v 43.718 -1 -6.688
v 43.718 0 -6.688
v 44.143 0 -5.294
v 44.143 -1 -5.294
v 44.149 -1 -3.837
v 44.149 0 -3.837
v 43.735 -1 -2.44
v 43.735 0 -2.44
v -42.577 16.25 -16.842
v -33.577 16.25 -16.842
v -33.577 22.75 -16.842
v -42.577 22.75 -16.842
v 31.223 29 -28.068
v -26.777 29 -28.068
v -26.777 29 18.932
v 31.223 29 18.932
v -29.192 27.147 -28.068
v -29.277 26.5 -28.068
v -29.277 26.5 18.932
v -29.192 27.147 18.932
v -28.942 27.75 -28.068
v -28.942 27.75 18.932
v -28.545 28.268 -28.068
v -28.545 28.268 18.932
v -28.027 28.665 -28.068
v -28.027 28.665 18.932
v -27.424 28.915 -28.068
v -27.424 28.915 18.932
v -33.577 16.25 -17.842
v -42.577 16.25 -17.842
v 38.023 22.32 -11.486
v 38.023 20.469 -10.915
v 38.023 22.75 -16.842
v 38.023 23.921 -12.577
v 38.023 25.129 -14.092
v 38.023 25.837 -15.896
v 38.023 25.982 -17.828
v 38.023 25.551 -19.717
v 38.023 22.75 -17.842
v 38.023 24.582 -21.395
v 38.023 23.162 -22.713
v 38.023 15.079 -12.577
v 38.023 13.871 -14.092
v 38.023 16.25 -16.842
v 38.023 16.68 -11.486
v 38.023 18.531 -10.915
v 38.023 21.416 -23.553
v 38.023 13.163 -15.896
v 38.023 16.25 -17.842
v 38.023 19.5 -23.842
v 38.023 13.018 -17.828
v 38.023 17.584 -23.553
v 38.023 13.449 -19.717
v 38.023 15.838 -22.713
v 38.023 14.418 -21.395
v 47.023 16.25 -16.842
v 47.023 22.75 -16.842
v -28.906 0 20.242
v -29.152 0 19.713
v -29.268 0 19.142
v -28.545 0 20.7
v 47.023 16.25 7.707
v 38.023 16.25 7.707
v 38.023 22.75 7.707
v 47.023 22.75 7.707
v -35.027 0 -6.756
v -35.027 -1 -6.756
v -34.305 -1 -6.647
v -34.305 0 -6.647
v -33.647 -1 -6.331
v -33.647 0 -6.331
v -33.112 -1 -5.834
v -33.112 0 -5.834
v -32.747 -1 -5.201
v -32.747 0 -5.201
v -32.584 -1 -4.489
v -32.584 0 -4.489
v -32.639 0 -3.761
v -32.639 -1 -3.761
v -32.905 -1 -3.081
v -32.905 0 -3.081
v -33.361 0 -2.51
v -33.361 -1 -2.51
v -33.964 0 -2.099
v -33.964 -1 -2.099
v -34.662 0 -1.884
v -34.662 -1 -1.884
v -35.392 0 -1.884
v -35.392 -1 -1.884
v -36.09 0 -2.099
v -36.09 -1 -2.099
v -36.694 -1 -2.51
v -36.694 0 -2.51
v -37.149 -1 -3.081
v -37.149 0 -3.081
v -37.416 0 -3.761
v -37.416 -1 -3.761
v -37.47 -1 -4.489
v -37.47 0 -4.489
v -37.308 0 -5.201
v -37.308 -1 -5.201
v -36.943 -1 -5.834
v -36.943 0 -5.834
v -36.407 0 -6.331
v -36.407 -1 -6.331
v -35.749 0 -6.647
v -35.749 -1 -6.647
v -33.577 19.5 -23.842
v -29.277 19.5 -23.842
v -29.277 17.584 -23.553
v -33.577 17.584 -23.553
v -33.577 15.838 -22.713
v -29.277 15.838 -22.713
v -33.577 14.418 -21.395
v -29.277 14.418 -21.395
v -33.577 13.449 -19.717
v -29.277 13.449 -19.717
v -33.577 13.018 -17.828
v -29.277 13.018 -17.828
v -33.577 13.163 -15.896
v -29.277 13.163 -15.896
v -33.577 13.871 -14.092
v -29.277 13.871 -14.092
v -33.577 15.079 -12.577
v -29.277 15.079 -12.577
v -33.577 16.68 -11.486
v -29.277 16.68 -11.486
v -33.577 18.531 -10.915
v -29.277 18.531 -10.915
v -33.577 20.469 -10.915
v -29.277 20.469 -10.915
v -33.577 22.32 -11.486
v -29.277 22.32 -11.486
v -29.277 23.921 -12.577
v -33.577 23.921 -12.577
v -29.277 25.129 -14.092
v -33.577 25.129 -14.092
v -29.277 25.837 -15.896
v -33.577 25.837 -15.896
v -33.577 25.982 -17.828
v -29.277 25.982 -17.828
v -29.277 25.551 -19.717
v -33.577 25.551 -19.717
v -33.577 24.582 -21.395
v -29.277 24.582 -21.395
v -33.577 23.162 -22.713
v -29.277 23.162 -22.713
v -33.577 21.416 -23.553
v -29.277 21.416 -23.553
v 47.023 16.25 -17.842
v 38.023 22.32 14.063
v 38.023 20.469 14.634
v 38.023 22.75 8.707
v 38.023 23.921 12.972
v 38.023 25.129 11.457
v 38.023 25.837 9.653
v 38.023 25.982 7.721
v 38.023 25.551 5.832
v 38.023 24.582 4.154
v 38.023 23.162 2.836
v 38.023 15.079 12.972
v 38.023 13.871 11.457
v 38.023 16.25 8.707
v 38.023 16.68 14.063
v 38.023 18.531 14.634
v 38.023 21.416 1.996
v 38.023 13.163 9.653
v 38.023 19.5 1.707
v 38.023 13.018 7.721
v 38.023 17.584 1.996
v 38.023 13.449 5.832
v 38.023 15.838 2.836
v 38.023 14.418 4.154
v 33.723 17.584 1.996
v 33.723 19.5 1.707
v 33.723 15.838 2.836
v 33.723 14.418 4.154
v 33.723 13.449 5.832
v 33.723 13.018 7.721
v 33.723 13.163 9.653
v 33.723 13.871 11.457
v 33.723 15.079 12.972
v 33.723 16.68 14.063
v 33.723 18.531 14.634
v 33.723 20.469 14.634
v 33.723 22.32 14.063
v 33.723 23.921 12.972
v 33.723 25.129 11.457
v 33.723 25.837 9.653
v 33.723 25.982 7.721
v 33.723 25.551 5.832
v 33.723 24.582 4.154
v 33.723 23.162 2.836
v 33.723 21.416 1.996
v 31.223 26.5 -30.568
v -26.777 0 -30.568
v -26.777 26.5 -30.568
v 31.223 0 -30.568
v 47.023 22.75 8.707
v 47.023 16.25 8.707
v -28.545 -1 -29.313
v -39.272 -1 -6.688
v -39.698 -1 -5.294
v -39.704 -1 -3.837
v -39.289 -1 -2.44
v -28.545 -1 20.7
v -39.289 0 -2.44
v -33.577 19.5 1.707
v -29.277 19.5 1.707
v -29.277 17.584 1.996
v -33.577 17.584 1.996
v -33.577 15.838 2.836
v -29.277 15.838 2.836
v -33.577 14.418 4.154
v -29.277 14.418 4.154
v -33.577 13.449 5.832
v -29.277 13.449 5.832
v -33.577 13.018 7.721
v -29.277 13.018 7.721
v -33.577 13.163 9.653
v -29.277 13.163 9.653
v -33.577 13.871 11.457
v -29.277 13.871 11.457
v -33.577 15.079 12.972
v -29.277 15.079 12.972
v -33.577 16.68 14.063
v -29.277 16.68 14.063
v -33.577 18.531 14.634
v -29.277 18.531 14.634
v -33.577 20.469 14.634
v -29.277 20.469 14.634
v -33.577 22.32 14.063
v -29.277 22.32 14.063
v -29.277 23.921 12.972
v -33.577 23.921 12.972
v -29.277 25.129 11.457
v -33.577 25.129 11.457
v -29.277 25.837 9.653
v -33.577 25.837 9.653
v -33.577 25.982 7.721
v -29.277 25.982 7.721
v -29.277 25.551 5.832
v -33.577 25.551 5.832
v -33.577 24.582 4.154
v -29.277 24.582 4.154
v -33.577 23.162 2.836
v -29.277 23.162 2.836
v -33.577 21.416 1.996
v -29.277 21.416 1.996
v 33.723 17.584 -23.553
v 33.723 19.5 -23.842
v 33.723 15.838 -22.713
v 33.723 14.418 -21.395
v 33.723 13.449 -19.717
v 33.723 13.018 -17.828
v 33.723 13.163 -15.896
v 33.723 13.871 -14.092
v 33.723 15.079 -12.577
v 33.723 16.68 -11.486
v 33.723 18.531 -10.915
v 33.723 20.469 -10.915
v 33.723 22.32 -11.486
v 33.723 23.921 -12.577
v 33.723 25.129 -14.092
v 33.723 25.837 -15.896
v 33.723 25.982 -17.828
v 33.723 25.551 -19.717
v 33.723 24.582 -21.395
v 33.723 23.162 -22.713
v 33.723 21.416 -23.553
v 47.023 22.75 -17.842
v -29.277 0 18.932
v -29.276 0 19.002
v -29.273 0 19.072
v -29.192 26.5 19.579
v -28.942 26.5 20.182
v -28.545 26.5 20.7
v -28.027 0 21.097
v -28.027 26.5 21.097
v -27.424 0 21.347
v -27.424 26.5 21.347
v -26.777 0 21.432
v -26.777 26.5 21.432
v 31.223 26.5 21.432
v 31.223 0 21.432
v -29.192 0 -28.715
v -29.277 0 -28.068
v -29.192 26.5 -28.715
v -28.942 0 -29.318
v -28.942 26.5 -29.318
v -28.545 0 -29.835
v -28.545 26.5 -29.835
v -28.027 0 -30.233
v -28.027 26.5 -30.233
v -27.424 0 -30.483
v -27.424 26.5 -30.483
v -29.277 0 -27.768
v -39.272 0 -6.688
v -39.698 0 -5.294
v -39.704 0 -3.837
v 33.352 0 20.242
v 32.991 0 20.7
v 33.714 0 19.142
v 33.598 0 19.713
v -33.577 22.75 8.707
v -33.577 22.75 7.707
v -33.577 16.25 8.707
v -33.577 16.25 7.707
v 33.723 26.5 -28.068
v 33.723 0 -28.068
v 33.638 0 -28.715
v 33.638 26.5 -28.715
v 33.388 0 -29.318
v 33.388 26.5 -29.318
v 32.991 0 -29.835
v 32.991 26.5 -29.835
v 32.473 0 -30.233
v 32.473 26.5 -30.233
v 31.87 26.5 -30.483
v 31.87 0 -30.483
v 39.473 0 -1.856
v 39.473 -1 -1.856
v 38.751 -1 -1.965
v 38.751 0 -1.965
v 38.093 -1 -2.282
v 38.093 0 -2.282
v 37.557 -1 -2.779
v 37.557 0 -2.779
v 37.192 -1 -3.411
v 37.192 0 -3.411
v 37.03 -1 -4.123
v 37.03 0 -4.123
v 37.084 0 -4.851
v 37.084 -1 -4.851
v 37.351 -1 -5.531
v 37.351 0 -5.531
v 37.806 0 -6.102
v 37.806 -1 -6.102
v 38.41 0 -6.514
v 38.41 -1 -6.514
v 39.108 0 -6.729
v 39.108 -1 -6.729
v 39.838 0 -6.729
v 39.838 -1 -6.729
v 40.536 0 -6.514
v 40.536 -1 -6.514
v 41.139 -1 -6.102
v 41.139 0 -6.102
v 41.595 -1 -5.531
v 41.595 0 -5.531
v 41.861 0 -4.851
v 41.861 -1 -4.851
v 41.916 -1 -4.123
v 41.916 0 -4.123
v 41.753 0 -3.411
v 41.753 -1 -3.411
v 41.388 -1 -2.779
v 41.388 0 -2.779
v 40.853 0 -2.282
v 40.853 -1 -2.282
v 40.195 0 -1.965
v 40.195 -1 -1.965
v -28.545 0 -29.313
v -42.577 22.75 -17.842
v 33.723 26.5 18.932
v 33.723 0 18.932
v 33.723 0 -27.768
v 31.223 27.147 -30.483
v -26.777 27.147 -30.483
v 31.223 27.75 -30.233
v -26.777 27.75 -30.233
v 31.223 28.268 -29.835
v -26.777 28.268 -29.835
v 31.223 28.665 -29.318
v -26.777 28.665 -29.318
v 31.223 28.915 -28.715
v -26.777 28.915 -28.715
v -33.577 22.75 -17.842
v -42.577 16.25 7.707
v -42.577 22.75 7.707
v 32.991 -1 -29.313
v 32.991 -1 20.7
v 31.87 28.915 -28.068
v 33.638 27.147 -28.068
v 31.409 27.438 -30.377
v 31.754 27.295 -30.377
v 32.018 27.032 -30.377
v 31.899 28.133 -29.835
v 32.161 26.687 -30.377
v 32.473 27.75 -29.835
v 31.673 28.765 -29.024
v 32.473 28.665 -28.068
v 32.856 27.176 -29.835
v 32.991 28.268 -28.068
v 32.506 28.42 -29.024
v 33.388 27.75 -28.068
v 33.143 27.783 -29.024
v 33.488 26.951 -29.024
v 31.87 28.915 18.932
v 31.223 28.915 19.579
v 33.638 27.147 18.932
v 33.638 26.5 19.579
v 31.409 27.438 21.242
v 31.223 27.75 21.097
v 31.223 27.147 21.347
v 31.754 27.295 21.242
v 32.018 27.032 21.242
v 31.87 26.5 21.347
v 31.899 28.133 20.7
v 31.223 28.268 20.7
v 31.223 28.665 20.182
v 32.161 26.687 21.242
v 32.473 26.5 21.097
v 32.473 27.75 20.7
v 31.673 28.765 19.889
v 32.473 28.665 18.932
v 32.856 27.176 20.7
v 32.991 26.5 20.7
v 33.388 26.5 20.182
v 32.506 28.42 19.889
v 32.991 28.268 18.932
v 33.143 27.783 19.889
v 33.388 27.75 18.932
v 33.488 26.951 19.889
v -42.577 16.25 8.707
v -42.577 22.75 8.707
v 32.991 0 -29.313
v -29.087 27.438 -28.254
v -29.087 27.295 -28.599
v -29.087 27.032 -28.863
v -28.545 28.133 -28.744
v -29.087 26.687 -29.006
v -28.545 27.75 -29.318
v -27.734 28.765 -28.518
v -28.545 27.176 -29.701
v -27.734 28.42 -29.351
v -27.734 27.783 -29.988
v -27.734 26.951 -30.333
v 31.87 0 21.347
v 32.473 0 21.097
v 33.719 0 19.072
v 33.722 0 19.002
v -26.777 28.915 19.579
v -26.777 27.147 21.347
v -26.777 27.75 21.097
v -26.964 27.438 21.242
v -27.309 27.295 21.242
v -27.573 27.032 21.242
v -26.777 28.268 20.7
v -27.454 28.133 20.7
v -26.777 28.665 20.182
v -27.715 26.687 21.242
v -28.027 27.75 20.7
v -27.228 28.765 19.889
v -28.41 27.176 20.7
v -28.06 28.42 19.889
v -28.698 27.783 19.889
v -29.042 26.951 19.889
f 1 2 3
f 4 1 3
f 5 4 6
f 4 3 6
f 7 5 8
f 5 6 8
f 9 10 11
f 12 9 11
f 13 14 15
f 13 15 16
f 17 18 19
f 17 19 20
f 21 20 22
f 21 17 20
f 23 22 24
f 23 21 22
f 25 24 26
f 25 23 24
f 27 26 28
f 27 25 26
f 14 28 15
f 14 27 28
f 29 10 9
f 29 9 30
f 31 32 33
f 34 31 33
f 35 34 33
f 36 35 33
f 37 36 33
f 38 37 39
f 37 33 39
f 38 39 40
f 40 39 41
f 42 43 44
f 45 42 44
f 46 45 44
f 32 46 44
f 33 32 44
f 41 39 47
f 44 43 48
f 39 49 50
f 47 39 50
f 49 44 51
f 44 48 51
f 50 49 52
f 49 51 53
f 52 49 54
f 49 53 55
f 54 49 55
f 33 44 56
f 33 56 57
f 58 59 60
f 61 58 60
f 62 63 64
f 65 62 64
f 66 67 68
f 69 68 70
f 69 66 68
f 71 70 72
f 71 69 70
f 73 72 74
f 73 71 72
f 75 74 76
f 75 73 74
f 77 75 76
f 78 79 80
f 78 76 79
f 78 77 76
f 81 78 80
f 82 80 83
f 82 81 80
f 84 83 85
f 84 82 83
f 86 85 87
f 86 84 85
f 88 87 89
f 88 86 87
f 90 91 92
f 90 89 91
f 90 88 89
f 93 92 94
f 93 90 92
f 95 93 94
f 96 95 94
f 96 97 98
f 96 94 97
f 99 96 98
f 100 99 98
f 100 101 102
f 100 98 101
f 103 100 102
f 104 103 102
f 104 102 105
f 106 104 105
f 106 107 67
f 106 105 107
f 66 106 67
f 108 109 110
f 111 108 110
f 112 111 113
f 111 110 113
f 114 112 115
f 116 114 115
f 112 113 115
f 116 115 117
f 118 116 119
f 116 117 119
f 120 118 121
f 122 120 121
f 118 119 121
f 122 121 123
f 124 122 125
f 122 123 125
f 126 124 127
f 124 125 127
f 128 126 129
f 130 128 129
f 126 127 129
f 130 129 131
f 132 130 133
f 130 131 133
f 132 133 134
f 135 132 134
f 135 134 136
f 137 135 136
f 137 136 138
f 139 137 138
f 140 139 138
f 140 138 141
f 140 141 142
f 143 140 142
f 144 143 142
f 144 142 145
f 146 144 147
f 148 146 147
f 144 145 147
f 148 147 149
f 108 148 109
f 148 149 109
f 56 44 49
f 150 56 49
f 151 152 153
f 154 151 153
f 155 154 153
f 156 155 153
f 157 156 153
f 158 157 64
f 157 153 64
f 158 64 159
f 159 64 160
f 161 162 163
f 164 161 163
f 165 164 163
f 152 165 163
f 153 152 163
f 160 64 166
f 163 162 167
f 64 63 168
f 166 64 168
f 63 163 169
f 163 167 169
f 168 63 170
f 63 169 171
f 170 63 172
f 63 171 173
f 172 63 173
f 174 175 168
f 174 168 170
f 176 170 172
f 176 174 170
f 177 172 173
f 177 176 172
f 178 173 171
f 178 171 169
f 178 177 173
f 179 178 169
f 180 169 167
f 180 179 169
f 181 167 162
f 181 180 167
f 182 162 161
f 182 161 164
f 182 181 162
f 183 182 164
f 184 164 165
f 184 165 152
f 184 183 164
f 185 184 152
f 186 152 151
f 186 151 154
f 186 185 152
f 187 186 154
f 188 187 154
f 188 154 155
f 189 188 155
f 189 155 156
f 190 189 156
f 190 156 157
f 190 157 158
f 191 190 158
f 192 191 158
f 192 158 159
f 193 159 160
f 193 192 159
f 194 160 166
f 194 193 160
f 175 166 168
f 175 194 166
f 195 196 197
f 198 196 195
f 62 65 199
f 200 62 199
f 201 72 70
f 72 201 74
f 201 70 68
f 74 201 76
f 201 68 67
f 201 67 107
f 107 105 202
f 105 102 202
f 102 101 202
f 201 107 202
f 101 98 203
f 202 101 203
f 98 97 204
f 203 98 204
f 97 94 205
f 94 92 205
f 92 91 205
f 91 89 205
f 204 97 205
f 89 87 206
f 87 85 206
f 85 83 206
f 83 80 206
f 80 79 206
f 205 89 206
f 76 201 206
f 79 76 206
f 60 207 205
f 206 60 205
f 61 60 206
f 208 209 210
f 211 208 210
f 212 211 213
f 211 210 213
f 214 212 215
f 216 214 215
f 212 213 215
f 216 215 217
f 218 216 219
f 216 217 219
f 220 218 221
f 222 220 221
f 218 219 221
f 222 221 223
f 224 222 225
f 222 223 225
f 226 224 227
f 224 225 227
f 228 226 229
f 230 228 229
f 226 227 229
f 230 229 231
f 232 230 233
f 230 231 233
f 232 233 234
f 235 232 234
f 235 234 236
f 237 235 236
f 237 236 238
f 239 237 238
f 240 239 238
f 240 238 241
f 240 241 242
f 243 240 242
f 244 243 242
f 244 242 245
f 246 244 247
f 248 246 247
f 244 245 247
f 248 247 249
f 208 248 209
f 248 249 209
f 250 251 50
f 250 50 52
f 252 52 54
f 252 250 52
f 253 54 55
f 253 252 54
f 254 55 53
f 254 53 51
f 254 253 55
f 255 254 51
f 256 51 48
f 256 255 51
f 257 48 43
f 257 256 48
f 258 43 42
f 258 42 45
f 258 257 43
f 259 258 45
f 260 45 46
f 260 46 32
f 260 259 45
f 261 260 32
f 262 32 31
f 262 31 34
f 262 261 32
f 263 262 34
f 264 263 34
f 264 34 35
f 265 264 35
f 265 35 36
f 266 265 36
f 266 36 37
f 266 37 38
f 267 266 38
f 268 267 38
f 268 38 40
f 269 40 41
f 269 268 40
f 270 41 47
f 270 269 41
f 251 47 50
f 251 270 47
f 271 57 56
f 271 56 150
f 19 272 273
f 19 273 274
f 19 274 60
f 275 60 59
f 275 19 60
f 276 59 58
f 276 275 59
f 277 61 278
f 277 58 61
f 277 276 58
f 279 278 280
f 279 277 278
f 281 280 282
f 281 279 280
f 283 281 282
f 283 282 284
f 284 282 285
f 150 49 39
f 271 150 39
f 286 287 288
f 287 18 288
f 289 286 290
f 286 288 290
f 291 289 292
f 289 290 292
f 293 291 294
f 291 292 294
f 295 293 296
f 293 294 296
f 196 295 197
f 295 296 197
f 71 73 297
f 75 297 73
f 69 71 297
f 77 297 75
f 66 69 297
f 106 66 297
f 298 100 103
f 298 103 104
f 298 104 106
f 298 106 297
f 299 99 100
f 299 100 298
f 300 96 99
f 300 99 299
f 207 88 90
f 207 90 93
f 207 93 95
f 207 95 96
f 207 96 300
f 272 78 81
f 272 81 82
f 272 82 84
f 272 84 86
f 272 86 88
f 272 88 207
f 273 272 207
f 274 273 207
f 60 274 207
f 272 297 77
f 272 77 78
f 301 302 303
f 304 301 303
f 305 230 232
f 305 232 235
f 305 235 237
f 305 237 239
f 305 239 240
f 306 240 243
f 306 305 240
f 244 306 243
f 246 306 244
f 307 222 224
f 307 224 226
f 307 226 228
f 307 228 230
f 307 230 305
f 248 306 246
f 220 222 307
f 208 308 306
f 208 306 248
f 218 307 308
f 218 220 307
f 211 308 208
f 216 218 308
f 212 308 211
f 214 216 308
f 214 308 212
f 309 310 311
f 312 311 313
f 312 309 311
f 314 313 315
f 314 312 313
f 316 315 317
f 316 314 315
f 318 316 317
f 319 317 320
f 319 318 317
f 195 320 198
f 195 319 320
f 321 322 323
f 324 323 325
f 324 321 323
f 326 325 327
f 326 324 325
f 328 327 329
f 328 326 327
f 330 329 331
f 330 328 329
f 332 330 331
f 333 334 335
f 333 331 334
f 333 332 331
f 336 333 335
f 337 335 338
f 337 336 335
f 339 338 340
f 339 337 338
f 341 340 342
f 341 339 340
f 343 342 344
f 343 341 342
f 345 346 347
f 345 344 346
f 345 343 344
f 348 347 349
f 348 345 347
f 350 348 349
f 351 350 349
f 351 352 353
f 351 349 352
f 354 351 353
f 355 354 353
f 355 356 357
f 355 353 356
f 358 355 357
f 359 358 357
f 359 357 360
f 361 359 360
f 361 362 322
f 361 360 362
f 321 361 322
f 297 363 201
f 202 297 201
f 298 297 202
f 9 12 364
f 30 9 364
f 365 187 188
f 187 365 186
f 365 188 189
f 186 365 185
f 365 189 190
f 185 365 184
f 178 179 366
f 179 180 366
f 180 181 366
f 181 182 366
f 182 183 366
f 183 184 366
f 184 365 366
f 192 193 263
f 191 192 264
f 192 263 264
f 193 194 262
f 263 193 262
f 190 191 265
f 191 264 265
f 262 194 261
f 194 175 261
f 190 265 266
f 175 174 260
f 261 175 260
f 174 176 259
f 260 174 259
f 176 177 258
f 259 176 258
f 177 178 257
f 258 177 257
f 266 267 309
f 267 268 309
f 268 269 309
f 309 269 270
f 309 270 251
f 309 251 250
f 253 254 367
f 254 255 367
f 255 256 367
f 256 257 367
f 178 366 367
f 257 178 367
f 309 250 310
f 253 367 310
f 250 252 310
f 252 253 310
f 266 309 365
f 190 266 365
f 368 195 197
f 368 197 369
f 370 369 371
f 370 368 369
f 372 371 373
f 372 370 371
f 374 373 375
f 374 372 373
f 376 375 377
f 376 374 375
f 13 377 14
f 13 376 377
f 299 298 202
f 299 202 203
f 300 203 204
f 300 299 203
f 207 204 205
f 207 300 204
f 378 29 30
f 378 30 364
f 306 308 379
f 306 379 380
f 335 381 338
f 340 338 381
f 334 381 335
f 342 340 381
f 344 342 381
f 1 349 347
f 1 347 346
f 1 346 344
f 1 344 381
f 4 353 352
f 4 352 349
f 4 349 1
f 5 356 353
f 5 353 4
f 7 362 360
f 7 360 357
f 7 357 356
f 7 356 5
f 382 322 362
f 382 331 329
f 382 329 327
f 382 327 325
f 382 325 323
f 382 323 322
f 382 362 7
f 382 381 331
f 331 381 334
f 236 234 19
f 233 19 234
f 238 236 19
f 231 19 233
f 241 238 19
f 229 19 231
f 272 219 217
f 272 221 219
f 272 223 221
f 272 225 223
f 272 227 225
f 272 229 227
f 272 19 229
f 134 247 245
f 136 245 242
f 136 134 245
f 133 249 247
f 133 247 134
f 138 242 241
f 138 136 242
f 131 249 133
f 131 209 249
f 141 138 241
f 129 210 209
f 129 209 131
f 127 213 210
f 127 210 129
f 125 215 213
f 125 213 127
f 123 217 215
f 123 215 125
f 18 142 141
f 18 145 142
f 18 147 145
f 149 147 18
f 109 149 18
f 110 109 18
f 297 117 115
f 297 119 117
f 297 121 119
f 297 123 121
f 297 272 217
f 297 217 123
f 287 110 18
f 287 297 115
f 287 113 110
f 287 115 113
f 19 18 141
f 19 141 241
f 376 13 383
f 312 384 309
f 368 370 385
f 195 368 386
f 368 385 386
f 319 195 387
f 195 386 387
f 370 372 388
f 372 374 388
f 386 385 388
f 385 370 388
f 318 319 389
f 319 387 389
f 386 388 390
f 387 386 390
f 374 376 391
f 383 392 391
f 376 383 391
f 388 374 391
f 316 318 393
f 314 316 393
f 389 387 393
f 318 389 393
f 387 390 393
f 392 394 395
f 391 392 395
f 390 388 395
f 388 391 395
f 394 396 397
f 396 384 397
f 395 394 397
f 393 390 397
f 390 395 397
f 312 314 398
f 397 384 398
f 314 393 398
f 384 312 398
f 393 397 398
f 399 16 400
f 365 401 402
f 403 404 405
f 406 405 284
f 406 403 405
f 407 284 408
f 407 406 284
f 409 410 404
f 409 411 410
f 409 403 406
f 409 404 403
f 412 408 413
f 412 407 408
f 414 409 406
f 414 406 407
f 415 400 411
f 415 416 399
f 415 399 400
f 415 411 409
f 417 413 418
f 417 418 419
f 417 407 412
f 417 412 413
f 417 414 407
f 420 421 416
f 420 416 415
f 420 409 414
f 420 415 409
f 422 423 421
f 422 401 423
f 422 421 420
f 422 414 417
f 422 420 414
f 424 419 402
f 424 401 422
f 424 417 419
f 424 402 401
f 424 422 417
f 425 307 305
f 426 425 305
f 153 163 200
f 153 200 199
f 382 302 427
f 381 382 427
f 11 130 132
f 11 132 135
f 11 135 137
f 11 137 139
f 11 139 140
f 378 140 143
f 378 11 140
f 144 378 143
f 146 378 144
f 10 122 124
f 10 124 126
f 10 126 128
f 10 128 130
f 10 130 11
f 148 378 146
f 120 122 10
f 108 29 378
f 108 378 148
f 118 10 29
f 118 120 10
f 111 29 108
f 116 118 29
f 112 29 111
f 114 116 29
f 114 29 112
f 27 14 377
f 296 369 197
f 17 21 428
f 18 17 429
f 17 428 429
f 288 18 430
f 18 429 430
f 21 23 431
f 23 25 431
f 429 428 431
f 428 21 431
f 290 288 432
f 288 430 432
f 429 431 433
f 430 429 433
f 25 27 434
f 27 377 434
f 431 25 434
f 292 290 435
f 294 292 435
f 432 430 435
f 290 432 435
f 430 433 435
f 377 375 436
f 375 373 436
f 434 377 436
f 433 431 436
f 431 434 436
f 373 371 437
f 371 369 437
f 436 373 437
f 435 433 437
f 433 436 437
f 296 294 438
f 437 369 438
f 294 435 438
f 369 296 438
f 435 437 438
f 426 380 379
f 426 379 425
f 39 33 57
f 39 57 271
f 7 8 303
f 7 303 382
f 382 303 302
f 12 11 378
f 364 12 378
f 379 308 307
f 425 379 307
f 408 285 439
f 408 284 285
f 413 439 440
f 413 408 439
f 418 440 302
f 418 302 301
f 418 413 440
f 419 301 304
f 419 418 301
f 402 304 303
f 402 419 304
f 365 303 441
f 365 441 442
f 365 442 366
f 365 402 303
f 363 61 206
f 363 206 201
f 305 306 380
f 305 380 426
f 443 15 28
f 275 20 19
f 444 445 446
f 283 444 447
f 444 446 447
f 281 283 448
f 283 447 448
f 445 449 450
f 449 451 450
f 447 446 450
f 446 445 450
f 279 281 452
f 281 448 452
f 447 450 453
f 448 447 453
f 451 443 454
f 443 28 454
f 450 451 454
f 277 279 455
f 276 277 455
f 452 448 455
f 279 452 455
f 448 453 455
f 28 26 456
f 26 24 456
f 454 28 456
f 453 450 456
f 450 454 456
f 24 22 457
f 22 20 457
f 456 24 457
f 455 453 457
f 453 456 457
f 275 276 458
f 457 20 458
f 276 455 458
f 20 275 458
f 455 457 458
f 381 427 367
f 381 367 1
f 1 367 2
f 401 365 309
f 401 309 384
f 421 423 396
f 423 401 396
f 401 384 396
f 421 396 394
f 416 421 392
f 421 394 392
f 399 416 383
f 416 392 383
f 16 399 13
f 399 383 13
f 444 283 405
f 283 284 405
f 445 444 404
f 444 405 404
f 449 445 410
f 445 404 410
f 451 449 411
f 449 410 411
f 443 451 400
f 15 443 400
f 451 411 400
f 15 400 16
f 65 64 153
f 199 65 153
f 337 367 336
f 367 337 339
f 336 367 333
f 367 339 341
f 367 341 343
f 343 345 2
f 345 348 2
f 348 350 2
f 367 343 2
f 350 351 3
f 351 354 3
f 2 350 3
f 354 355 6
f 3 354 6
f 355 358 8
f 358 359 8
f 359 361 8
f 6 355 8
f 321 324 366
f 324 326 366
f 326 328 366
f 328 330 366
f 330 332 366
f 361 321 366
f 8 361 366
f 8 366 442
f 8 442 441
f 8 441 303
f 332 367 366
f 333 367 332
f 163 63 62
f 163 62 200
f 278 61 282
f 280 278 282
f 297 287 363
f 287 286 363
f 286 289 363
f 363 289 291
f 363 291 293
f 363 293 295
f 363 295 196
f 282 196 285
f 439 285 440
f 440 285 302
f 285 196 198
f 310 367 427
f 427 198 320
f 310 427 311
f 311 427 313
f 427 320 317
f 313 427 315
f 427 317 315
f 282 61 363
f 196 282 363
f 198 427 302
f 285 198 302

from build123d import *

# Parameters (mm, degrees)
SZKIC1_W                    = 63
SZKIC1_H                    = 52
DODANIE_WYCI_GNI_CIE1_DEPTH = 29
ZAOKR_GLENIE1_R             = 2.5
DODANIE_WYCI_GNI_CIE2_DEPTH = 1
SZKIC3_R                    = 2.45
WYTNIJ_WYCI_GNI_CIE6_DEPTH  = 62.065626678
SZKIC4_R                    = 6.5
DODANIE_WYCI_GNI_CIE3_DEPTH = 4.3
SZKIC5_W                    = 1
SZKIC5_H                    = 6.5
DODANIE_WYCI_GNI_CIE4_DEPTH = 9
LUSTRO4_COPY_1_SKETCH_W     = 1
LUSTRO4_COPY_1_SKETCH_H     = 6.5
LUSTRO4_COPY_1_DEPTH        = 9
LUSTRO4_COPY_2_SKETCH_W     = 1
LUSTRO4_COPY_2_SKETCH_H     = 6.5
LUSTRO4_COPY_2_DEPTH        = 9


with BuildPart() as part:
    # Szkic1 → Dodanie-wyciągnięcie1 (new body)
    with BuildSketch(Plane(origin=(0, 0, 0), x_dir=(1, 0, 0), z_dir=(0, 1, 0))):
        with Locations((2.222834646, 4.567716535)):
            Rectangle(SZKIC1_W, SZKIC1_H)
    extrude(amount=DODANIE_WYCI_GNI_CIE1_DEPTH)

    # Zaokrąglenie1
    zaokr_glenie1_edges = [part.edges().sort_by_distance(p)[0] for p in [
        (33.722834646, 29, -4.567716535),
        (2.222834646, 29, -30.567716535),
        (-29.277165354, 29, -4.567716535),
        (2.222834646, 29, 21.432283465),
        (-29.277165354, 14.5, -30.567716535),
        (33.722834646, 14.5, -30.567716535),
        (33.722834646, 14.5, 21.432283465),
        (-29.277165354, 14.5, 21.432283465),
    ]]
    fillet(zaokr_glenie1_edges, radius=ZAOKR_GLENIE1_R)

    # Szkic2 → Dodanie-wyciągnięcie2 (add)
    with BuildSketch(Plane.XZ):
        with BuildLine():
            Line((-39.289158378, -2.43984114), (-28.544932307, 20.700050418))
            Line((-28.544932307, 20.700050418), (-28.544932307, -29.312606034))
            Line((-28.544932307, -29.312606034), (-39.272080362, -6.687578711))
            ThreePointArc((-39.272080362, -6.687578711), (-39.754125902, -4.565613657), (-39.289158378, -2.43984114))
        make_face()
        with BuildLine():
            Line((32.990601599, 20.700050418), (32.990601599, -29.312606034))
            Line((32.990601599, -29.312606034), (43.717749653, -6.687578711))
            ThreePointArc((43.717749653, -6.687578711), (44.199795194, -4.565613657), (43.734827669, -2.43984114))
            Line((43.734827669, -2.43984114), (32.990601599, 20.700050418))
        make_face()
    extrude(amount=DODANIE_WYCI_GNI_CIE2_DEPTH)

    # Szkic3 → Wytnij-wyciągnięcie6 (cut, through all)
    with BuildSketch(Plane.XZ):
        with Locations(Location((-35.027165354, -4.306277808, 0), (0, 0, 270))):
            Circle(SZKIC3_R)
        with Locations(Location((39.472834646, -4.306277808, 0), (0, 0, 90))):
            Circle(SZKIC3_R)
    extrude(amount=WYTNIJ_WYCI_GNI_CIE6_DEPTH, mode=Mode.SUBTRACT)

    # Szkic4 → Dodanie-wyciągnięcie3 (add)
    with BuildSketch(Plane.ZY.offset(29.277165354)):
        with Locations(Location((8.206789605, 19.5, 0), (0, 0, 180))):
            Circle(SZKIC4_R)
        with Locations(Location((-17.342222675, 19.5, 0), (0, 0, 180))):
            Circle(SZKIC4_R)
    dodanie_wyci_gni_cie3 = extrude(amount=DODANIE_WYCI_GNI_CIE3_DEPTH)

    # Szkic5 → Dodanie-wyciągnięcie4 (add)
    with BuildSketch(Plane.ZY.offset(33.577165354)):
        with Locations((8.206789605, 19.5)):
            Rectangle(SZKIC5_W, SZKIC5_H)
    dodanie_wyci_gni_cie4 = extrude(amount=DODANIE_WYCI_GNI_CIE4_DEPTH)

    # Lustro1: Dodanie-wyciągnięcie4 across plane
    add(dodanie_wyci_gni_cie4.mirror(Plane(origin=(0, 0, -4.567716535), x_dir=(1, 0, 0), z_dir=(0, 0, -1))))

    # Lustro2: Dodanie-wyciągnięcie3 across plane
    add(dodanie_wyci_gni_cie3.mirror(Plane.ZY.offset(-2.222834646)))

    # Lustro3: Dodanie-wyciągnięcie4 across plane
    add(dodanie_wyci_gni_cie4.mirror(Plane.ZY.offset(-2.222834646)))

    # Lustro4 copy 1 sketch → Lustro4 copy 1 (add)
    with BuildSketch(Plane(origin=(38.022834646, 0, -9.135433071), x_dir=(0, 0, -1), z_dir=(1, 0, 0))):
        with Locations((8.206789605, 19.5)):
            Rectangle(LUSTRO4_COPY_1_SKETCH_W, LUSTRO4_COPY_1_SKETCH_H)
    extrude(amount=LUSTRO4_COPY_1_DEPTH)

    # Lustro4 copy 2 sketch → Lustro4 copy 2 (add)
    with BuildSketch(Plane(origin=(38.022834646, 0, 0), x_dir=(0, 0, 1), z_dir=(1, 0, 0))):
        with Locations((8.206789605, -19.5)):
            Rectangle(LUSTRO4_COPY_2_SKETCH_W, LUSTRO4_COPY_2_SKETCH_H)
    extrude(amount=LUSTRO4_COPY_2_DEPTH)


solid = part.part
